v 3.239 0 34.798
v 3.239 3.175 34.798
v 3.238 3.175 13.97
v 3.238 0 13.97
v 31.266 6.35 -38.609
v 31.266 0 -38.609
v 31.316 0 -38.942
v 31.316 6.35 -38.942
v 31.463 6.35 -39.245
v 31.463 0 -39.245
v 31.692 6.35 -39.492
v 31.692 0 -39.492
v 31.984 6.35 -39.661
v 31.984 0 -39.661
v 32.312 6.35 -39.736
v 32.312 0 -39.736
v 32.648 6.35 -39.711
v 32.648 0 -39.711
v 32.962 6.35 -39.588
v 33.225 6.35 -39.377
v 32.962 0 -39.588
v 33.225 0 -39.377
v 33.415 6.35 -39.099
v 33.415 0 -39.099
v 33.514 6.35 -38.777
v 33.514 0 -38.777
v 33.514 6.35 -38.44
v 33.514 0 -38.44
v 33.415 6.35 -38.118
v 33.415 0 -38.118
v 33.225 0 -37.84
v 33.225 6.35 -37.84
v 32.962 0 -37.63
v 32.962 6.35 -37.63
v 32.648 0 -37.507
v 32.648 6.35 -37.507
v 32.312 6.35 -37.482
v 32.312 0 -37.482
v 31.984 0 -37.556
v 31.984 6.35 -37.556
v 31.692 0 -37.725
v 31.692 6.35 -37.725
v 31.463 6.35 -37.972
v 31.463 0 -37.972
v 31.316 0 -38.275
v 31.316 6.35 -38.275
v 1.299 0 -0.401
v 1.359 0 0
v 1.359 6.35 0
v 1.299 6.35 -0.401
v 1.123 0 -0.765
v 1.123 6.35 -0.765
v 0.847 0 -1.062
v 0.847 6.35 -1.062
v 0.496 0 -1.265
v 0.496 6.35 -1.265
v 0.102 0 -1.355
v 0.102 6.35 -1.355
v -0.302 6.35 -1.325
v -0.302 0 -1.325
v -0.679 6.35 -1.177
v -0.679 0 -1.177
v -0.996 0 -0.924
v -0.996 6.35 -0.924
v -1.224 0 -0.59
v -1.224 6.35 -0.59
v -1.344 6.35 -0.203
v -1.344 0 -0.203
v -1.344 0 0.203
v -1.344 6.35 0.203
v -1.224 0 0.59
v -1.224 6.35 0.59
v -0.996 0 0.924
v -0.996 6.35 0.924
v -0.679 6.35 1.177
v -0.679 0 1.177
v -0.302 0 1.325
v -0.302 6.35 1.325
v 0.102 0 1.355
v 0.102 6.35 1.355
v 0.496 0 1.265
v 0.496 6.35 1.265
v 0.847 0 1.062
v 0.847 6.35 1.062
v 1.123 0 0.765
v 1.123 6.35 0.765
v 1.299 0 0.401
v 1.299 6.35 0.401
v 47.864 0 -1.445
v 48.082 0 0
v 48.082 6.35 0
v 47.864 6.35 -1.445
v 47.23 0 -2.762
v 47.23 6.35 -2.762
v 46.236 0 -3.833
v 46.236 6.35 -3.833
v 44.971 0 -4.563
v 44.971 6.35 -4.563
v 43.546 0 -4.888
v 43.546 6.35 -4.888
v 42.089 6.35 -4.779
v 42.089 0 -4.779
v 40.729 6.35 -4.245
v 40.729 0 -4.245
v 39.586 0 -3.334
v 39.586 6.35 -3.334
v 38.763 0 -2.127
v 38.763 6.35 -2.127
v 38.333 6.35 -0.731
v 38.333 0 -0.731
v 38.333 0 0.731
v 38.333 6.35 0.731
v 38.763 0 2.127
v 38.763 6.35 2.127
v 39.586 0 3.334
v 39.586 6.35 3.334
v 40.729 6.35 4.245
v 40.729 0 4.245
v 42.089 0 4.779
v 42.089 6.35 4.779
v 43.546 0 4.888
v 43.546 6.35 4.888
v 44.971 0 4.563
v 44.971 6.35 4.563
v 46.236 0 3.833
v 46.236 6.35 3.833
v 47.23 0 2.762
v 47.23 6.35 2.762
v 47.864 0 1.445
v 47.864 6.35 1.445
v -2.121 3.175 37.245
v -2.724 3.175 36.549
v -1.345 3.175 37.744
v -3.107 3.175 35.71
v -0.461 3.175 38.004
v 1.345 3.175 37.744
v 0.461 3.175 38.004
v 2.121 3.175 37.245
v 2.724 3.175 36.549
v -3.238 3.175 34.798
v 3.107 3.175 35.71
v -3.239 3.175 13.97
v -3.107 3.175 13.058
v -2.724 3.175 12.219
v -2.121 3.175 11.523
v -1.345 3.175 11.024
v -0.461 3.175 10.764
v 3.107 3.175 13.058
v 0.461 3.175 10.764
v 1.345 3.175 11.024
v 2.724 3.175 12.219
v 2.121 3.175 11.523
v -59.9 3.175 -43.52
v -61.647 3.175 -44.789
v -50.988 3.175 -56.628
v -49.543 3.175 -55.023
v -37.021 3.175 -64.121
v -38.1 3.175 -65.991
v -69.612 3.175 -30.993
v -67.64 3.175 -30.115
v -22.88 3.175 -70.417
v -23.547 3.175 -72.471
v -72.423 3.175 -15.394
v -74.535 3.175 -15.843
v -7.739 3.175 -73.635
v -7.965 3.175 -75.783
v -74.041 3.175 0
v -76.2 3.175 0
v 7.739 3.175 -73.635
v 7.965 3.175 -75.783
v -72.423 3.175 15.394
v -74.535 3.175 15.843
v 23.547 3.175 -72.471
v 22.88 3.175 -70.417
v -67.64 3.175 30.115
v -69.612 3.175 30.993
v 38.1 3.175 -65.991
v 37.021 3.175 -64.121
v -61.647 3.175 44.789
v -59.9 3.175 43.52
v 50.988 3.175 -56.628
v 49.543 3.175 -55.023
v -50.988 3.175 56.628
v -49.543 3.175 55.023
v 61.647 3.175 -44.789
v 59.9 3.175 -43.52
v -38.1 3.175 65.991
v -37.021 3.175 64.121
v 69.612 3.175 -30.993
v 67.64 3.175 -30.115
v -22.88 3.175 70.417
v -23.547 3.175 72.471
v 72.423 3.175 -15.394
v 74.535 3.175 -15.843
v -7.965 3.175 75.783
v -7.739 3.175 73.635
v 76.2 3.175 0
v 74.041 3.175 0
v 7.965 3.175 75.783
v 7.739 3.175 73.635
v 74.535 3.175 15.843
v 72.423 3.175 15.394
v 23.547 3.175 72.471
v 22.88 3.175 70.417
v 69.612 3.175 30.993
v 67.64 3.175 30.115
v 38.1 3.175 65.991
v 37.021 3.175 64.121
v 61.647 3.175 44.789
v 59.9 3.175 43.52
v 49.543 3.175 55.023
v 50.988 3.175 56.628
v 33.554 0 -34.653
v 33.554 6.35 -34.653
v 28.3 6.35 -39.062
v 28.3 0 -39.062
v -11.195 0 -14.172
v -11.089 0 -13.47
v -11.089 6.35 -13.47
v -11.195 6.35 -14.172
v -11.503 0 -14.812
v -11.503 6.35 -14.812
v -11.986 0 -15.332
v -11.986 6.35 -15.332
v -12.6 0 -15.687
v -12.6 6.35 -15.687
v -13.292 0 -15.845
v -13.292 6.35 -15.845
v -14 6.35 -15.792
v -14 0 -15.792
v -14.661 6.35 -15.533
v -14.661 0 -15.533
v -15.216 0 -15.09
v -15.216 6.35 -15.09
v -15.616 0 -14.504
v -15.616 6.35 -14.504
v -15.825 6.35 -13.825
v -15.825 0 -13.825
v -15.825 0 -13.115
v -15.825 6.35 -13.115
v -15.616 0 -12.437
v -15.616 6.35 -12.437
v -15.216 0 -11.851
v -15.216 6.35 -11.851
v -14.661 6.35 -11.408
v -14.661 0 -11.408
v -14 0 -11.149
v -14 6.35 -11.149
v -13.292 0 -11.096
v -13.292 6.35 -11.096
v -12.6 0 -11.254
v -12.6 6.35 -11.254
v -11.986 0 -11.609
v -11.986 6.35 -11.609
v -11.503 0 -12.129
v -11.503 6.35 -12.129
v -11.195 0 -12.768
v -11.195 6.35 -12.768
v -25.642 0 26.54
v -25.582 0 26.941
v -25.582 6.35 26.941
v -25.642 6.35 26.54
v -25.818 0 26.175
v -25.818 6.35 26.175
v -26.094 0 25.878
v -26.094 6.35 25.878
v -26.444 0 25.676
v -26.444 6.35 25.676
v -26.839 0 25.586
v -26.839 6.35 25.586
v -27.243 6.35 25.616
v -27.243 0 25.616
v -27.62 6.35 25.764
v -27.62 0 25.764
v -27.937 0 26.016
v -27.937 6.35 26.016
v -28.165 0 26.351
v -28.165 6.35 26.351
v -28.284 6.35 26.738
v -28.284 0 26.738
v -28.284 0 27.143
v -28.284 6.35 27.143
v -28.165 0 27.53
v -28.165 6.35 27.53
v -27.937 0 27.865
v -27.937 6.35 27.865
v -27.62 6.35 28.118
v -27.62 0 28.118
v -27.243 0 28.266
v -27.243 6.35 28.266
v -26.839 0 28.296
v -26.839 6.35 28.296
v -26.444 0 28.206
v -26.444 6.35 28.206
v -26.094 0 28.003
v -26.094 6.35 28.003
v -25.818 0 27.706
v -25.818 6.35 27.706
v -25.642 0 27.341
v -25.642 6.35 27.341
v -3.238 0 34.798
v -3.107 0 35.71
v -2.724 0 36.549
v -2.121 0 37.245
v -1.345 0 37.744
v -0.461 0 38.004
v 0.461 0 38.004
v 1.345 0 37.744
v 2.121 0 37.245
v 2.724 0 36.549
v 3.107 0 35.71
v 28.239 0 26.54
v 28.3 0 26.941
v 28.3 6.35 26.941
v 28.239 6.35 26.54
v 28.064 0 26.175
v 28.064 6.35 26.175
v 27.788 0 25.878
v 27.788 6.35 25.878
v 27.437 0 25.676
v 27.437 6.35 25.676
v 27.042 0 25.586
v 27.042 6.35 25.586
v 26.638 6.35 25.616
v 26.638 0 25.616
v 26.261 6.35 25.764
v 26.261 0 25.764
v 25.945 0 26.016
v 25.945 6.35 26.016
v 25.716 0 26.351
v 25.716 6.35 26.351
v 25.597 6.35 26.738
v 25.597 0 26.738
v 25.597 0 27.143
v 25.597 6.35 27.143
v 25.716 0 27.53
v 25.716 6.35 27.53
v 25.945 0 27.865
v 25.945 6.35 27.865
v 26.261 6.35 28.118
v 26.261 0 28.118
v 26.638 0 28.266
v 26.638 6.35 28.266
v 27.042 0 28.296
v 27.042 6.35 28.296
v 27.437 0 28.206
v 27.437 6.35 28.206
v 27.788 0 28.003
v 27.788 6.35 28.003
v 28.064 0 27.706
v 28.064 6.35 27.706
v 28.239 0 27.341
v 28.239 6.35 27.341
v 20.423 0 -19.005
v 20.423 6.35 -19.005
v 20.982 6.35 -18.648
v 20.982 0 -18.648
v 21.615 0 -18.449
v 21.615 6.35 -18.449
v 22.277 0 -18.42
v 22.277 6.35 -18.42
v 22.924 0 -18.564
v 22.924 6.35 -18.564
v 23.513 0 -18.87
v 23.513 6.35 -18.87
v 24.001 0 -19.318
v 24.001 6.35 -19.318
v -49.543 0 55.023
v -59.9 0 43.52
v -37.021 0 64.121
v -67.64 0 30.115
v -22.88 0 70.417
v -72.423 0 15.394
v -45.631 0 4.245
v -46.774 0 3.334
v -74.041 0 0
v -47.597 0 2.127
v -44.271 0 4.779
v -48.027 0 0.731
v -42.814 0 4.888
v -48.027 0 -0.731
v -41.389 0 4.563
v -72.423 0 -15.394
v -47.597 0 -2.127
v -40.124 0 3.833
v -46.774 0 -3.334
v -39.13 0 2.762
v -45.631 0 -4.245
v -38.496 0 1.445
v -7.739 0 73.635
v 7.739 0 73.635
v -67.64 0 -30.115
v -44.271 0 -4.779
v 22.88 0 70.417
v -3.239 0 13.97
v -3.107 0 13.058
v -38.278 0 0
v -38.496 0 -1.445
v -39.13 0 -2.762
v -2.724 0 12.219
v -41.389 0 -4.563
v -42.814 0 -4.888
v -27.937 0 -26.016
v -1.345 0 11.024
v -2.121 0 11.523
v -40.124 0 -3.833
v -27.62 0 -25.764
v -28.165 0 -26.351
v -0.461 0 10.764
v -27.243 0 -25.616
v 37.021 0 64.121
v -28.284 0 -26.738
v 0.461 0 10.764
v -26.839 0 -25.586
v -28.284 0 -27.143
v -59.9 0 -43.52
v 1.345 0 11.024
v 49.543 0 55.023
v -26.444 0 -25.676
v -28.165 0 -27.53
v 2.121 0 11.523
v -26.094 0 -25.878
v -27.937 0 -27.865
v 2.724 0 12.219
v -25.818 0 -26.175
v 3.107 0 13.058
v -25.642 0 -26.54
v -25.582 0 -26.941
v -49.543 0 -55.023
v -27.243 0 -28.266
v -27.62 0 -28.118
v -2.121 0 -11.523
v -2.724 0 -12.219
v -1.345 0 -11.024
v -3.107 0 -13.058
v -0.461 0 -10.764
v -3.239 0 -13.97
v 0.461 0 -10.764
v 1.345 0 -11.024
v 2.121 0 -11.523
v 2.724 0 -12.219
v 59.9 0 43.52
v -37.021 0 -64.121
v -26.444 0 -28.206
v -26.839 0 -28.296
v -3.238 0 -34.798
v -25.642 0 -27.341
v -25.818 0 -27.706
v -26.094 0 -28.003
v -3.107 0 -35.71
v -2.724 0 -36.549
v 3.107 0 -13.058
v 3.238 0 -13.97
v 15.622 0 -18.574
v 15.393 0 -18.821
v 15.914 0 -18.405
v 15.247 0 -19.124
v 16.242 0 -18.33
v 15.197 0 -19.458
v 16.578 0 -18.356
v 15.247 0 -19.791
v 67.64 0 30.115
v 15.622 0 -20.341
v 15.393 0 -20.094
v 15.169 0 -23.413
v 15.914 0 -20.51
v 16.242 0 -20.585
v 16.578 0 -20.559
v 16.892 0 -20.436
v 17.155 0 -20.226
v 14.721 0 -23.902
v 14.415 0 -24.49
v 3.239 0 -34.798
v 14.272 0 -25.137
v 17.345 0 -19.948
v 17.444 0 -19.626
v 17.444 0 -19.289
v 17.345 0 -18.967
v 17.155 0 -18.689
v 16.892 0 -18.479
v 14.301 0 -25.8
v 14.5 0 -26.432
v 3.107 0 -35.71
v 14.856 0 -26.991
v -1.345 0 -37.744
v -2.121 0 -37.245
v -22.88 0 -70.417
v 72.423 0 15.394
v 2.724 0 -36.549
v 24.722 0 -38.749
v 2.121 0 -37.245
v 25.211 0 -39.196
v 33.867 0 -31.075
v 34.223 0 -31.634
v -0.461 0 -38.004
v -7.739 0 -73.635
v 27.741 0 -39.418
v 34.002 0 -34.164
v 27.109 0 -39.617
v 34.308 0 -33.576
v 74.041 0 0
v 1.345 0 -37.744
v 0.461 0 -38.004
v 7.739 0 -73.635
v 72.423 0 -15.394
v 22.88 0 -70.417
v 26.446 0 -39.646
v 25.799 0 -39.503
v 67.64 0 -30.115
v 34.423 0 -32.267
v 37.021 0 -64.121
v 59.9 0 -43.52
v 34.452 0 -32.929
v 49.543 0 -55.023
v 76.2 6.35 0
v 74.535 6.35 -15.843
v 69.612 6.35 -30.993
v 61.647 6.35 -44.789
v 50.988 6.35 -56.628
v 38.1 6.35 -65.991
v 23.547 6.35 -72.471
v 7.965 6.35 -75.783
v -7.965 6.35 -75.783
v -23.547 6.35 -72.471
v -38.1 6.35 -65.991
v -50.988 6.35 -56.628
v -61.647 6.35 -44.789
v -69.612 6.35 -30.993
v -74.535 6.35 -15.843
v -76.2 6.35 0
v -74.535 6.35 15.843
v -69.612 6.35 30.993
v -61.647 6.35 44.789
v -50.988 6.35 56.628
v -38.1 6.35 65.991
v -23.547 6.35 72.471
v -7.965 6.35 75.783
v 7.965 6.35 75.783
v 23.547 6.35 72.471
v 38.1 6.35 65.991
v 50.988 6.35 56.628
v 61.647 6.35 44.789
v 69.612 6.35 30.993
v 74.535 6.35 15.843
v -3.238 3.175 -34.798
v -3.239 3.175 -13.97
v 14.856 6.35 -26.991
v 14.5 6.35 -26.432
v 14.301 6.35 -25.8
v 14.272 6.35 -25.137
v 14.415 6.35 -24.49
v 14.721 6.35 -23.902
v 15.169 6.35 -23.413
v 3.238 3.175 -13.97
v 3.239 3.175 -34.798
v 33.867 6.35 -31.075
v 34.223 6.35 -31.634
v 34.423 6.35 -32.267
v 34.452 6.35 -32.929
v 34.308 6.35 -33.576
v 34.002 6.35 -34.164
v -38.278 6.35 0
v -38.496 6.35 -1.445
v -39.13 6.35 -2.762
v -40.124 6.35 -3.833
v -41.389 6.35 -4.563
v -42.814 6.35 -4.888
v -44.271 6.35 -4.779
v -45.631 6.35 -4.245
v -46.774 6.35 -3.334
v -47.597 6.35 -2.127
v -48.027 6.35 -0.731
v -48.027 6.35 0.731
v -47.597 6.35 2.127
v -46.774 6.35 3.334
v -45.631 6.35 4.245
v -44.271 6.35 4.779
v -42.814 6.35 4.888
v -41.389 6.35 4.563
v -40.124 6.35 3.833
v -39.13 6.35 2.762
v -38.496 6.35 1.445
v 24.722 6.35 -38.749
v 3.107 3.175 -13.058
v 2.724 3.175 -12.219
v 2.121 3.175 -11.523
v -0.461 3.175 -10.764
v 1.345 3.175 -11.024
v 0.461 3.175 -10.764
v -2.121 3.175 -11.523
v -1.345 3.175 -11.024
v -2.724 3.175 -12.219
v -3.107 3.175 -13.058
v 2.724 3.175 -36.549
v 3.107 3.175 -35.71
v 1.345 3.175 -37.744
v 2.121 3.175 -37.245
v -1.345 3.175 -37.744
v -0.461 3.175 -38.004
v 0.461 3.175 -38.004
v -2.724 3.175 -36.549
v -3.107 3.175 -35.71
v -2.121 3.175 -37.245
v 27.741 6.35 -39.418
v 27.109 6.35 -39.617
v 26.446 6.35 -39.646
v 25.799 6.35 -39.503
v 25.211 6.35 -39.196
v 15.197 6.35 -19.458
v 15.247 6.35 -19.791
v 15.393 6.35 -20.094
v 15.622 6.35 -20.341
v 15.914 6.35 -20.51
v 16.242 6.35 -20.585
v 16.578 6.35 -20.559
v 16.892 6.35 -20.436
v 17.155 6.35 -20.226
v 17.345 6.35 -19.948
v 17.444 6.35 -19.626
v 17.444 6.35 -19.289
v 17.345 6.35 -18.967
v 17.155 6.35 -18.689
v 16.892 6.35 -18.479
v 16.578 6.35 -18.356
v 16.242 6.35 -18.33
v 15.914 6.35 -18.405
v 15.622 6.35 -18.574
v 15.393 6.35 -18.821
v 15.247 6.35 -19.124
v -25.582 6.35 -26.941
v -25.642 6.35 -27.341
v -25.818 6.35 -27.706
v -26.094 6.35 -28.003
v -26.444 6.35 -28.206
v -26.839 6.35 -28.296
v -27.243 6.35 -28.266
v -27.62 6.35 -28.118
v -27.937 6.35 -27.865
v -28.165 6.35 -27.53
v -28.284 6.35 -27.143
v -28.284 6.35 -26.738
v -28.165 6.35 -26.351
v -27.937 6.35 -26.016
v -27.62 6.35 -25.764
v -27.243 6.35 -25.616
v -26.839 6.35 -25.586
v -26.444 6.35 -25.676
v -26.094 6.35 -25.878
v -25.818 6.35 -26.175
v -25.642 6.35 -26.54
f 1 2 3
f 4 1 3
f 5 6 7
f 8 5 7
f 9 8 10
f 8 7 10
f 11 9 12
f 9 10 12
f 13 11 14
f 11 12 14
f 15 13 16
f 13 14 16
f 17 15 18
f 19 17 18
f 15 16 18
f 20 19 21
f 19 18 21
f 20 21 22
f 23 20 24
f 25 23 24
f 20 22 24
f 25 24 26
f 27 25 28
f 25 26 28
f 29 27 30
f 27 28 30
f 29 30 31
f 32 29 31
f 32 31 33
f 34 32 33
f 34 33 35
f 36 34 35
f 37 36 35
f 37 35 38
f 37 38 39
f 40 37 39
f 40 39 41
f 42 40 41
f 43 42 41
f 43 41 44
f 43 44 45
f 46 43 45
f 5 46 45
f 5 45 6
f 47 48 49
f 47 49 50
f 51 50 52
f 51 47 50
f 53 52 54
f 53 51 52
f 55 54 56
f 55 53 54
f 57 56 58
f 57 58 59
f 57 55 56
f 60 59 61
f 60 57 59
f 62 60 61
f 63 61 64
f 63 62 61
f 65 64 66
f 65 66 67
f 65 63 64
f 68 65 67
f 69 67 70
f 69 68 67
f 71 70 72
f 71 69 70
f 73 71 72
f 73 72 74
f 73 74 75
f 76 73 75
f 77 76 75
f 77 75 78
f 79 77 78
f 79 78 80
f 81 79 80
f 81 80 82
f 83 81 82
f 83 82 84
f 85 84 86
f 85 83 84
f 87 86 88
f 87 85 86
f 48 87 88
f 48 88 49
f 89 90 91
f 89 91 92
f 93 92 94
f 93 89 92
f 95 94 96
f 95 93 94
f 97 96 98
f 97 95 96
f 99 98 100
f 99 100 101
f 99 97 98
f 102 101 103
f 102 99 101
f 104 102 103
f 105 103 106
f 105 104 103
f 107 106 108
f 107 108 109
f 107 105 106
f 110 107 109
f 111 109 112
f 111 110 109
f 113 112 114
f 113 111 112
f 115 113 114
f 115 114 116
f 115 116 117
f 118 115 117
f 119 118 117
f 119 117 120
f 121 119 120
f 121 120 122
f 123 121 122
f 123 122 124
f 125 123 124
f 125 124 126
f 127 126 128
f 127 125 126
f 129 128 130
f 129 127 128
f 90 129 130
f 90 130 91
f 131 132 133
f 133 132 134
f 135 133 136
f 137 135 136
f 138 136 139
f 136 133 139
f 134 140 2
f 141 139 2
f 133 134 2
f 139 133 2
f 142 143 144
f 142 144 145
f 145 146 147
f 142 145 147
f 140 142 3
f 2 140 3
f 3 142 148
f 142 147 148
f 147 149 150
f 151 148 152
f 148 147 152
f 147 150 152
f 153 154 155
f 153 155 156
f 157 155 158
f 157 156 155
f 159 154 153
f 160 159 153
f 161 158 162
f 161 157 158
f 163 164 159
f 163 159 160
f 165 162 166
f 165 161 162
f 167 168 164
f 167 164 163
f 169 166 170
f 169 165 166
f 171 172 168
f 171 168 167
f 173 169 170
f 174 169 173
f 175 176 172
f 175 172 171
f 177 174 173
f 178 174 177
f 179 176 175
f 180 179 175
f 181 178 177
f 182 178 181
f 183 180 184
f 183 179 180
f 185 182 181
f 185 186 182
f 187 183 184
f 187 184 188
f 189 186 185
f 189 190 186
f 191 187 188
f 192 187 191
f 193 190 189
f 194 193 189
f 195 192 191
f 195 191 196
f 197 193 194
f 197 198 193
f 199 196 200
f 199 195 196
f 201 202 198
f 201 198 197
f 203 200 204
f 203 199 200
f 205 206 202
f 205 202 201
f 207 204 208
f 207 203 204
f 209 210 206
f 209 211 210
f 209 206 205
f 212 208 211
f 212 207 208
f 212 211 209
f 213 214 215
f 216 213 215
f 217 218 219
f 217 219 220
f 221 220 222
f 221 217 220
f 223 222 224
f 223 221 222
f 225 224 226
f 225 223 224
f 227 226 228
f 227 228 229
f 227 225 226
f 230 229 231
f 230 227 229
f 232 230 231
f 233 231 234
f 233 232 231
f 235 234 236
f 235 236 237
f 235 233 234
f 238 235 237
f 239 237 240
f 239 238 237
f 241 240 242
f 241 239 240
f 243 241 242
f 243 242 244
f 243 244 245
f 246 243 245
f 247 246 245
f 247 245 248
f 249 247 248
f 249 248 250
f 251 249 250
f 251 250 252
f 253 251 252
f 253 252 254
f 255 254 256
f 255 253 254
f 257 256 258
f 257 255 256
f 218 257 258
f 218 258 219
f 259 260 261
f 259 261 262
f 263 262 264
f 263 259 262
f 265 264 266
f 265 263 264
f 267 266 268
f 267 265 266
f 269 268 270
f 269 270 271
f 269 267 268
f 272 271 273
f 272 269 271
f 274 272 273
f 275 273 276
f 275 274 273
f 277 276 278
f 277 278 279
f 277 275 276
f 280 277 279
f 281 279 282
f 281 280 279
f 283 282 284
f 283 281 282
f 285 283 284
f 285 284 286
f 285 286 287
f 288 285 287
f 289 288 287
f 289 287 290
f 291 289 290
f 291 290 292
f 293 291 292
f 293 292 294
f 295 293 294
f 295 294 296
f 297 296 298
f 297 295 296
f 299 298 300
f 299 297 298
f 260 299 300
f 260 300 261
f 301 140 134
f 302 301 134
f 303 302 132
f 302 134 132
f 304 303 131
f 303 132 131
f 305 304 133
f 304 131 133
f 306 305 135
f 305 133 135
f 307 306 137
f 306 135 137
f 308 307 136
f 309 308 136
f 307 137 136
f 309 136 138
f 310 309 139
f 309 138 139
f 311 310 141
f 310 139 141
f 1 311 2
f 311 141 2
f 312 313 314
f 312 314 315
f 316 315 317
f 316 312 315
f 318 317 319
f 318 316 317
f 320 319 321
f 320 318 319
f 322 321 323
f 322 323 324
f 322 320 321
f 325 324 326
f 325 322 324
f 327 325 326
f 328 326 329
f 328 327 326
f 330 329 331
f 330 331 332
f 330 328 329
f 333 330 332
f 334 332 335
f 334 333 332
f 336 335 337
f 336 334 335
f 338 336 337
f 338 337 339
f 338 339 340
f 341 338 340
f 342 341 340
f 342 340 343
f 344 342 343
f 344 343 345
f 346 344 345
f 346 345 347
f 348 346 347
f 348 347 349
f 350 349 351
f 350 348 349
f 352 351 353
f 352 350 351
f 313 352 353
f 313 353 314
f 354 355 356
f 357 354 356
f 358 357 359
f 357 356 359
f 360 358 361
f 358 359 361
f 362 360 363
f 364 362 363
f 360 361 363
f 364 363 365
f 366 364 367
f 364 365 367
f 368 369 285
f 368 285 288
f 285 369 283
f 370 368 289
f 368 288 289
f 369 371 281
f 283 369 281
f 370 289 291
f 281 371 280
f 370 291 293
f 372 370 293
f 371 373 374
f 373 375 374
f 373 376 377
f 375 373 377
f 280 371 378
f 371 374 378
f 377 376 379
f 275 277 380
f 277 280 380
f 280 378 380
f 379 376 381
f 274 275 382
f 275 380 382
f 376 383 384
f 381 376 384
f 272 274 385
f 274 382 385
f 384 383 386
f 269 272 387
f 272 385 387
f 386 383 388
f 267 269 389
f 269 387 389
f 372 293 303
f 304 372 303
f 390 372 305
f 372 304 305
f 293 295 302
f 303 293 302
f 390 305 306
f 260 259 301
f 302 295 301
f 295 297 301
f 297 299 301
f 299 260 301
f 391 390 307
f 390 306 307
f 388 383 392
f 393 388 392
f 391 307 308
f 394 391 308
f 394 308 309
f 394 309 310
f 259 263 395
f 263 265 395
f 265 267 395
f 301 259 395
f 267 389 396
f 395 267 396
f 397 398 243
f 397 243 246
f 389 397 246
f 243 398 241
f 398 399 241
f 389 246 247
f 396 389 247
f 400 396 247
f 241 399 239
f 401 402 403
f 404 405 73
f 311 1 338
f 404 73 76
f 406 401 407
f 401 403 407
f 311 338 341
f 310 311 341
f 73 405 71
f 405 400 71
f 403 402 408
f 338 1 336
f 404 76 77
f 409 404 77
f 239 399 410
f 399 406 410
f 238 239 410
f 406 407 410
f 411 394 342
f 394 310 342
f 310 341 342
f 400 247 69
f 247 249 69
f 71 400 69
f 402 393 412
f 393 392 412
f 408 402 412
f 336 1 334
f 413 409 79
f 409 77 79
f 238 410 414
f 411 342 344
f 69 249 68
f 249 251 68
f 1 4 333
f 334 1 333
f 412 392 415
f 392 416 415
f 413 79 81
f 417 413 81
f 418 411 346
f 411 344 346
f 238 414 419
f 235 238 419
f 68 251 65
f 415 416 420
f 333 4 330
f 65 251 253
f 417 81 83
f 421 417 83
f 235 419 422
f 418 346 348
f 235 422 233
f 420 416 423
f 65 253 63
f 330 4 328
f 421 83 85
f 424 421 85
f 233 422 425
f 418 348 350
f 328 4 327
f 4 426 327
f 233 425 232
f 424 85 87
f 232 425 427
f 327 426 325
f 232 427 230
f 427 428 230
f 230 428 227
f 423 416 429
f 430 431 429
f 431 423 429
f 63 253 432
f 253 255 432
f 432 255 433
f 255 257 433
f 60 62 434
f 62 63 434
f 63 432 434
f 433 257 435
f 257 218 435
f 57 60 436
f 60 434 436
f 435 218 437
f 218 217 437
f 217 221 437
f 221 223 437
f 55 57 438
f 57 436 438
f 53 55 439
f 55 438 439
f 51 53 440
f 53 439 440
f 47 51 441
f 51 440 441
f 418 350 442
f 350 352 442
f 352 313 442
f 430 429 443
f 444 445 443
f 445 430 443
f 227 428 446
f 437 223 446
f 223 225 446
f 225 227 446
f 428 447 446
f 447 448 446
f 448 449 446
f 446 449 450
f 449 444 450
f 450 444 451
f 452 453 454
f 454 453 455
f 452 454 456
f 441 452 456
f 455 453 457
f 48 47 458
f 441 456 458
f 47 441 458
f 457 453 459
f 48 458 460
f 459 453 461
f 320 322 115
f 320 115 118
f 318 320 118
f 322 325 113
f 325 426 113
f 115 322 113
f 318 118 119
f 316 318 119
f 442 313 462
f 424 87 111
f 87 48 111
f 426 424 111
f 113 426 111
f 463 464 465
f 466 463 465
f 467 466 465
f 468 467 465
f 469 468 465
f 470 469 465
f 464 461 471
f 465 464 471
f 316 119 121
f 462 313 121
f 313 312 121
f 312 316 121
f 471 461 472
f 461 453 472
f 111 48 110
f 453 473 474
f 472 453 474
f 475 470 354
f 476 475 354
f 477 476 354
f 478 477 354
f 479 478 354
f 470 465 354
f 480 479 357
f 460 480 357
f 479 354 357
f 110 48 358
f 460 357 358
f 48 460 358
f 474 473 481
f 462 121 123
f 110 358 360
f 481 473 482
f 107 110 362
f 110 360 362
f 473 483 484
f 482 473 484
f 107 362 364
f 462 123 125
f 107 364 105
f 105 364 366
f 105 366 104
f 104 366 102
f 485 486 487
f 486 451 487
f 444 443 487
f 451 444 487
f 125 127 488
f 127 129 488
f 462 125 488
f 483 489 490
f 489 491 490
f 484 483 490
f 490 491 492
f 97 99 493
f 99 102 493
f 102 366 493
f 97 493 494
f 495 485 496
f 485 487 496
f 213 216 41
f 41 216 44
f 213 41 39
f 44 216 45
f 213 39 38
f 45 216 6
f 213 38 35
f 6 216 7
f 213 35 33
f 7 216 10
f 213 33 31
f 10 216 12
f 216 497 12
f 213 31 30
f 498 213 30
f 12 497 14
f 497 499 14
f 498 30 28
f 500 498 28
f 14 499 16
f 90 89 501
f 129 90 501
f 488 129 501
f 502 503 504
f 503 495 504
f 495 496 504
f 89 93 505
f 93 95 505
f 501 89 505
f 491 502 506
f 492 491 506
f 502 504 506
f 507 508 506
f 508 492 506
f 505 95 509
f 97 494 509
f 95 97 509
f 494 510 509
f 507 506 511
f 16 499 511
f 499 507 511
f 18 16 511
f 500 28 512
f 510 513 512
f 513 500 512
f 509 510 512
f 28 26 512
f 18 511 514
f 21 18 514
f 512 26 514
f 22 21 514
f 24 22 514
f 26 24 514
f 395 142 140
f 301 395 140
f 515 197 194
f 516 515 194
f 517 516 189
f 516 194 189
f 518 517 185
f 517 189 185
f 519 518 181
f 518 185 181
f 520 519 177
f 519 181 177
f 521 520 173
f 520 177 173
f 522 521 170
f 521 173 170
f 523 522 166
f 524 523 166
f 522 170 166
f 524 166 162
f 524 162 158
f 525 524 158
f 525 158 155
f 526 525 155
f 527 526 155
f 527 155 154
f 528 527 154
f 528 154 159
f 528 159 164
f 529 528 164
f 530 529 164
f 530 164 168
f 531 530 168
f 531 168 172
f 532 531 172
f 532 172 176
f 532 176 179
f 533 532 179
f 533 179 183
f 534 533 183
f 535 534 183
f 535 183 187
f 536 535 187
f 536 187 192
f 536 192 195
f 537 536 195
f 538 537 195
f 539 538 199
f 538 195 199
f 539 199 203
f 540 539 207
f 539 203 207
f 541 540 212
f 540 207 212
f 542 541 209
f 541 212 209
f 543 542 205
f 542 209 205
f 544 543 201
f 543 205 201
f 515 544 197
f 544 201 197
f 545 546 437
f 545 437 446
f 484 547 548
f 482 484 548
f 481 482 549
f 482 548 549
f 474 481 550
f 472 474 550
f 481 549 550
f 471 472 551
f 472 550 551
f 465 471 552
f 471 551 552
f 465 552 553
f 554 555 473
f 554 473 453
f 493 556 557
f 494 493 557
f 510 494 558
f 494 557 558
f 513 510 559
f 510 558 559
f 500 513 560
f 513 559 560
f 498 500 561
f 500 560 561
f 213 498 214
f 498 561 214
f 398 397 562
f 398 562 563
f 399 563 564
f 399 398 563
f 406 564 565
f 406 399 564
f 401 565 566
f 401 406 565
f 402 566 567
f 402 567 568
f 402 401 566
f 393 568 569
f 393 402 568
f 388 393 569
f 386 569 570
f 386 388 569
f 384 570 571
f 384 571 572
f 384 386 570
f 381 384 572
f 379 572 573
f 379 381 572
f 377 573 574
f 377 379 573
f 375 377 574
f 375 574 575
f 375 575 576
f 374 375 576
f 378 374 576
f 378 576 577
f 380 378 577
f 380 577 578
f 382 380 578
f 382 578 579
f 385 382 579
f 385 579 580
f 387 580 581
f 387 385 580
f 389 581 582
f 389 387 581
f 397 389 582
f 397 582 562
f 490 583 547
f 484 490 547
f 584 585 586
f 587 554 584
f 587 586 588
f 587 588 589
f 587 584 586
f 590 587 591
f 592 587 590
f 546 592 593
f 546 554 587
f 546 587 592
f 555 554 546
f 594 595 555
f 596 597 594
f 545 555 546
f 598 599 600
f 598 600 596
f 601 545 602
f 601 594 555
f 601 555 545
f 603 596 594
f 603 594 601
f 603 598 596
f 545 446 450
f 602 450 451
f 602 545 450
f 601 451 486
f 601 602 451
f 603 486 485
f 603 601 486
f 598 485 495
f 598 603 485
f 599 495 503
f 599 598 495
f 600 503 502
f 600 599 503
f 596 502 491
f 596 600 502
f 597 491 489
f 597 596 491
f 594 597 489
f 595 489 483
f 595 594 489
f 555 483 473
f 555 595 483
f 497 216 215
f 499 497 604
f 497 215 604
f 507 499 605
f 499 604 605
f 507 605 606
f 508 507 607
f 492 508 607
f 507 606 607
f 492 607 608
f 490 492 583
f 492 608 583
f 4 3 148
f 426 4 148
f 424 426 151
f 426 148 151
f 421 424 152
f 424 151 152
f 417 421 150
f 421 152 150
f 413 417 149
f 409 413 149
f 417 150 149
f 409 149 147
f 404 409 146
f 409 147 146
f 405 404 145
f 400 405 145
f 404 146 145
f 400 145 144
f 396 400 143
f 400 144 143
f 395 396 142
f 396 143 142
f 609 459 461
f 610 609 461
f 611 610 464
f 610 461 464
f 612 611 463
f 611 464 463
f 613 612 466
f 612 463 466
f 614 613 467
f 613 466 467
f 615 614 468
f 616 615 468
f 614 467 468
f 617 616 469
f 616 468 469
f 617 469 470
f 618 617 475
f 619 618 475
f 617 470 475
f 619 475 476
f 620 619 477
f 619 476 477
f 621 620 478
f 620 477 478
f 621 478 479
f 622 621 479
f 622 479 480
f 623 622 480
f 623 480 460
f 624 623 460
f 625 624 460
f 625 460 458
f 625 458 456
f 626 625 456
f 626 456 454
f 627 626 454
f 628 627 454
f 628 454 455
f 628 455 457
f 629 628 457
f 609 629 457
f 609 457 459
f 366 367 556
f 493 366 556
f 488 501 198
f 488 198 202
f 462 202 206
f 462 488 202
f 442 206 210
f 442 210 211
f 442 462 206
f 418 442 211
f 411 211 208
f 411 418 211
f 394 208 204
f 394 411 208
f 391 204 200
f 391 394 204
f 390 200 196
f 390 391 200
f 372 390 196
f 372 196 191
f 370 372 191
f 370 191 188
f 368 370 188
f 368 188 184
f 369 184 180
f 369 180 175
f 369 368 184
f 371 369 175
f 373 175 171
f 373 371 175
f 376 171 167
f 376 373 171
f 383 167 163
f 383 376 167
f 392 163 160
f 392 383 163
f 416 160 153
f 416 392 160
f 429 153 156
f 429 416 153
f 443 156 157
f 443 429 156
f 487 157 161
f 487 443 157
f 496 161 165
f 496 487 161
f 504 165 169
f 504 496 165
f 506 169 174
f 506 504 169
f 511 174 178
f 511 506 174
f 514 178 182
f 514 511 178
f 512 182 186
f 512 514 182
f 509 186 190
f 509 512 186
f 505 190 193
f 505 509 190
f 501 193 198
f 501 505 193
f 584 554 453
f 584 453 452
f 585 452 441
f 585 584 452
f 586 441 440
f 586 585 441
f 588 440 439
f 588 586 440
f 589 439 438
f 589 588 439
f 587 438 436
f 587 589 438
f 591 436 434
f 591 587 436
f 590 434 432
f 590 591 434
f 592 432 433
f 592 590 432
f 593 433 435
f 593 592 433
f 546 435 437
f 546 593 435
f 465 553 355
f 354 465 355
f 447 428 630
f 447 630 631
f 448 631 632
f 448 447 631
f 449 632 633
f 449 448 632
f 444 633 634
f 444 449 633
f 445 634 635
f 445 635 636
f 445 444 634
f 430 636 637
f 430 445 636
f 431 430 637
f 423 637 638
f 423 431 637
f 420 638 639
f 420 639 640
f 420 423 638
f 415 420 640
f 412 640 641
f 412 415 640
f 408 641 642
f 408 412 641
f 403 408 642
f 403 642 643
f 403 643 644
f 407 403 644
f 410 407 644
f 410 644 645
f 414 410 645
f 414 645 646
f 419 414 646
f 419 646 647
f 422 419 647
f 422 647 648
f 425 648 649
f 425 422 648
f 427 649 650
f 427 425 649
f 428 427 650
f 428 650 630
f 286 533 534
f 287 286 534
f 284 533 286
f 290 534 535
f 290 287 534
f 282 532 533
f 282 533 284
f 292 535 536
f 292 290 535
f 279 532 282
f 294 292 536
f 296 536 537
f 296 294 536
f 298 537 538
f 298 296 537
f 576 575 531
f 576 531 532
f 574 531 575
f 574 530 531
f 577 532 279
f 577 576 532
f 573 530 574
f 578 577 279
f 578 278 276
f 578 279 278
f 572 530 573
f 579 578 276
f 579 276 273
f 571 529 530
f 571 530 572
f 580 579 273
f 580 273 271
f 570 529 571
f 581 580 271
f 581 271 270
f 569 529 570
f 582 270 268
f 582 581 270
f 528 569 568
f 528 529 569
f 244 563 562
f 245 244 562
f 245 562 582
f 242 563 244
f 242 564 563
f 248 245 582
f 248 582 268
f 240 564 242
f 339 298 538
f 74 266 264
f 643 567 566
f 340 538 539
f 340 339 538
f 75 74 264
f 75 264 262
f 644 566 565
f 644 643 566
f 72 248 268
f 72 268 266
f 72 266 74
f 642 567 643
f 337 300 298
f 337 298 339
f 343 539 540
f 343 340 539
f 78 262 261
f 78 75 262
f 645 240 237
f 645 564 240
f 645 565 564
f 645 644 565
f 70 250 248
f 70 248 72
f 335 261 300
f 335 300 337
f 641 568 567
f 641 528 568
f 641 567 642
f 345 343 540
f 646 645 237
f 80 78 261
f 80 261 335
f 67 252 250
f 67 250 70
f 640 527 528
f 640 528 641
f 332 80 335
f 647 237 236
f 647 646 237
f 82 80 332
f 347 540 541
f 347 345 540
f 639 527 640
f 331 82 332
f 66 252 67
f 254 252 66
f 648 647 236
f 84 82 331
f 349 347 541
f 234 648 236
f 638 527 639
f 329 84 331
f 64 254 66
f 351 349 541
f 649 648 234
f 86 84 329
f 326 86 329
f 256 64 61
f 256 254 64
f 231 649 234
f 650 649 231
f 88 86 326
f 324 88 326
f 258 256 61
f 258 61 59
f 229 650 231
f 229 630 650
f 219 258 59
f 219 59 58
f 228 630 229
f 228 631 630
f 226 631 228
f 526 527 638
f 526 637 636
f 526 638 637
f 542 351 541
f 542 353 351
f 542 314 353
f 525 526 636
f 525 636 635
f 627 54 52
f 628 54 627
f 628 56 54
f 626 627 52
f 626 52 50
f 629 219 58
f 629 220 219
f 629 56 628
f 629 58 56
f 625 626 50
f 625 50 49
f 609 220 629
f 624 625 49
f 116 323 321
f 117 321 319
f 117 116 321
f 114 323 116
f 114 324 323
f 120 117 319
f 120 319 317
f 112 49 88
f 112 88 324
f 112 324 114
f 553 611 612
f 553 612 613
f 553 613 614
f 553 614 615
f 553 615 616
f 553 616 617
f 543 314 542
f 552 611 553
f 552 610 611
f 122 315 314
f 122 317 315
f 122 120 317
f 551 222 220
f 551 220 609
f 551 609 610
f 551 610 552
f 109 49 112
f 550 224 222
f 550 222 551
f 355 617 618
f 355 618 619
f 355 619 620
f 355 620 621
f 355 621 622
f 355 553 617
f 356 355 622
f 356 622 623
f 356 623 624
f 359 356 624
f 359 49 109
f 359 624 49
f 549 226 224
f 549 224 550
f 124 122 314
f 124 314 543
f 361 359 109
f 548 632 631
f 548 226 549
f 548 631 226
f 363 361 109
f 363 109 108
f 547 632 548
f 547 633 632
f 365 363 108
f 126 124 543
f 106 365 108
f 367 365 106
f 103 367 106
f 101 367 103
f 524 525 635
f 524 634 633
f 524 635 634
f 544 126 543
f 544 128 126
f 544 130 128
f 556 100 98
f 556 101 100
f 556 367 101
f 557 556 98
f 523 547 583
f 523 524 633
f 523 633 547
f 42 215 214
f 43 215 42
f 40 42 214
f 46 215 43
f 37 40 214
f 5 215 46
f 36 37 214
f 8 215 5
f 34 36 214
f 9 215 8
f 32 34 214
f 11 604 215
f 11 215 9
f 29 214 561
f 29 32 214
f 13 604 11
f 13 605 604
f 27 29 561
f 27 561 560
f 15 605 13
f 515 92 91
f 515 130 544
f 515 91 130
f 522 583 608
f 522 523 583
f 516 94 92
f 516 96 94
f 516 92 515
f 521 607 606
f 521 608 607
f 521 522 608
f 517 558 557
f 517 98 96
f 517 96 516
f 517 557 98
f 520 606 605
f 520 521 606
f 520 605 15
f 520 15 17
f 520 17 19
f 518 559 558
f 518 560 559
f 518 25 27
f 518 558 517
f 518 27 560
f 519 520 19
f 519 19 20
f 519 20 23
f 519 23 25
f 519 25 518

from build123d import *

# Parameters (mm, degrees)
SKETCH1_R                 = 76.2
SKETCH1_R_2               = 4.9022
SKETCH1_R_3               = 1.3589
SKETCH1_R_4               = 2.38125
BOSS_EXTRUDE1_DEPTH       = 6.35
SKETCH2_R                 = 76.2
SKETCH2_R_2               = 74.041
CUT_EXTRUDE1_DEPTH        = 3.175
CUT_EXTRUDE2_START        = -3.175
CUT_EXTRUDE2_DEPTH        = 3.556
TAP_DRILL_FOR_4_40_TAP1_D = 2.2606
CUT_EXTRUDE3_DEPTH        = 7.35


with BuildPart() as part:
    # Sketch1 → Boss-Extrude1 (new body)
    with BuildSketch(Plane(origin=(0, 0, 0), x_dir=(1, 0, 0), z_dir=(0, 1, 0))):
        Circle(SKETCH1_R)
        with Locations((43.18, 0)):
            Circle(SKETCH1_R_2, mode=Mode.SUBTRACT)
        with Locations((-43.18, 0)):
            Circle(SKETCH1_R_2, mode=Mode.SUBTRACT)
        with Locations((-26.940768363, 26.940768363)):
            Circle(SKETCH1_R_3, mode=Mode.SUBTRACT)
        with Locations((26.940768363, -26.940768363)):
            Circle(SKETCH1_R_3, mode=Mode.SUBTRACT)
        with Locations((-13.470384182, 13.470384182)):
            Circle(SKETCH1_R_4, mode=Mode.SUBTRACT)
        with Locations((-26.940768363, -26.940768363)):
            Circle(SKETCH1_R_3, mode=Mode.SUBTRACT)
        Circle(SKETCH1_R_3, mode=Mode.SUBTRACT)
    extrude(amount=BOSS_EXTRUDE1_DEPTH)

    # Sketch2 → Cut-Extrude1 (cut)
    with BuildSketch(Plane.XZ):
        Circle(SKETCH2_R)
        Circle(SKETCH2_R_2, mode=Mode.SUBTRACT)
    extrude(amount=-CUT_EXTRUDE1_DEPTH, mode=Mode.SUBTRACT)

    # Sketch3 → Cut-Extrude2 (cut)
    with BuildSketch(Plane(origin=(0, 6.35, 0), x_dir=(1, 0, 0), z_dir=(0, 1, 0)).offset(CUT_EXTRUDE2_START)):
        with BuildLine():
            Line((3.2385, 34.798), (3.2385, 13.97))
            ThreePointArc((3.2385, 13.97), (0, 10.7315), (-3.2385, 13.97))
            Line((-3.2385, 13.97), (-3.2385, 34.798))
            ThreePointArc((-3.2385, 34.798), (0, 38.0365), (3.2385, 34.798))
        make_face()
        with BuildLine():
            Line((3.2385, -34.798), (3.2385, -13.97))
            ThreePointArc((3.2385, -13.97), (0, -10.7315), (-3.2385, -13.97))
            Line((-3.2385, -13.97), (-3.2385, -34.798))
            ThreePointArc((-3.2385, -34.798), (0, -38.0365), (3.2385, -34.798))
        make_face()
    extrude(amount=-CUT_EXTRUDE2_DEPTH, mode=Mode.SUBTRACT)

    # Tap Drill for #4-40 Tap1 (through all)
    with Locations(Plane(origin=(0, 6.35, 0), x_dir=(1, 0, 0), z_dir=(0, 1, 0))):
        with Locations((16.326805286, 19.457528855), (32.396495553, 38.608639962)):
            Hole(TAP_DRILL_FOR_4_40_TAP1_D / 2)

    # Sketch4 → Cut-Extrude3 (cut, through all)
    with BuildSketch(Plane(origin=(0, 6.35, 0), x_dir=(1, 0, 0), z_dir=(0, 1, 0))):
        with BuildLine():
            Line((15.169451366, 23.412825166), (20.422984157, 19.004587739))
            ThreePointArc((20.422984157, 19.004587739), (22.277040272, 18.420006091), (24.001417571, 19.317660095))
            Line((24.001417571, 19.317660095), (33.866921829, 31.074910238))
            ThreePointArc((33.866921829, 31.074910238), (34.451503477, 32.928966353), (33.553849472, 34.653343652))
            Line((33.553849472, 34.653343652), (28.300316681, 39.061581079))
            ThreePointArc((28.300316681, 39.061581079), (26.446260566, 39.646162727), (24.721883267, 38.748508722))
            Line((24.721883267, 38.748508722), (14.856379009, 26.99125858))
            ThreePointArc((14.856379009, 26.99125858), (14.271797362, 25.137202465), (15.169451366, 23.412825166))
        make_face()
    extrude(amount=-CUT_EXTRUDE3_DEPTH, mode=Mode.SUBTRACT)


solid = part.part
